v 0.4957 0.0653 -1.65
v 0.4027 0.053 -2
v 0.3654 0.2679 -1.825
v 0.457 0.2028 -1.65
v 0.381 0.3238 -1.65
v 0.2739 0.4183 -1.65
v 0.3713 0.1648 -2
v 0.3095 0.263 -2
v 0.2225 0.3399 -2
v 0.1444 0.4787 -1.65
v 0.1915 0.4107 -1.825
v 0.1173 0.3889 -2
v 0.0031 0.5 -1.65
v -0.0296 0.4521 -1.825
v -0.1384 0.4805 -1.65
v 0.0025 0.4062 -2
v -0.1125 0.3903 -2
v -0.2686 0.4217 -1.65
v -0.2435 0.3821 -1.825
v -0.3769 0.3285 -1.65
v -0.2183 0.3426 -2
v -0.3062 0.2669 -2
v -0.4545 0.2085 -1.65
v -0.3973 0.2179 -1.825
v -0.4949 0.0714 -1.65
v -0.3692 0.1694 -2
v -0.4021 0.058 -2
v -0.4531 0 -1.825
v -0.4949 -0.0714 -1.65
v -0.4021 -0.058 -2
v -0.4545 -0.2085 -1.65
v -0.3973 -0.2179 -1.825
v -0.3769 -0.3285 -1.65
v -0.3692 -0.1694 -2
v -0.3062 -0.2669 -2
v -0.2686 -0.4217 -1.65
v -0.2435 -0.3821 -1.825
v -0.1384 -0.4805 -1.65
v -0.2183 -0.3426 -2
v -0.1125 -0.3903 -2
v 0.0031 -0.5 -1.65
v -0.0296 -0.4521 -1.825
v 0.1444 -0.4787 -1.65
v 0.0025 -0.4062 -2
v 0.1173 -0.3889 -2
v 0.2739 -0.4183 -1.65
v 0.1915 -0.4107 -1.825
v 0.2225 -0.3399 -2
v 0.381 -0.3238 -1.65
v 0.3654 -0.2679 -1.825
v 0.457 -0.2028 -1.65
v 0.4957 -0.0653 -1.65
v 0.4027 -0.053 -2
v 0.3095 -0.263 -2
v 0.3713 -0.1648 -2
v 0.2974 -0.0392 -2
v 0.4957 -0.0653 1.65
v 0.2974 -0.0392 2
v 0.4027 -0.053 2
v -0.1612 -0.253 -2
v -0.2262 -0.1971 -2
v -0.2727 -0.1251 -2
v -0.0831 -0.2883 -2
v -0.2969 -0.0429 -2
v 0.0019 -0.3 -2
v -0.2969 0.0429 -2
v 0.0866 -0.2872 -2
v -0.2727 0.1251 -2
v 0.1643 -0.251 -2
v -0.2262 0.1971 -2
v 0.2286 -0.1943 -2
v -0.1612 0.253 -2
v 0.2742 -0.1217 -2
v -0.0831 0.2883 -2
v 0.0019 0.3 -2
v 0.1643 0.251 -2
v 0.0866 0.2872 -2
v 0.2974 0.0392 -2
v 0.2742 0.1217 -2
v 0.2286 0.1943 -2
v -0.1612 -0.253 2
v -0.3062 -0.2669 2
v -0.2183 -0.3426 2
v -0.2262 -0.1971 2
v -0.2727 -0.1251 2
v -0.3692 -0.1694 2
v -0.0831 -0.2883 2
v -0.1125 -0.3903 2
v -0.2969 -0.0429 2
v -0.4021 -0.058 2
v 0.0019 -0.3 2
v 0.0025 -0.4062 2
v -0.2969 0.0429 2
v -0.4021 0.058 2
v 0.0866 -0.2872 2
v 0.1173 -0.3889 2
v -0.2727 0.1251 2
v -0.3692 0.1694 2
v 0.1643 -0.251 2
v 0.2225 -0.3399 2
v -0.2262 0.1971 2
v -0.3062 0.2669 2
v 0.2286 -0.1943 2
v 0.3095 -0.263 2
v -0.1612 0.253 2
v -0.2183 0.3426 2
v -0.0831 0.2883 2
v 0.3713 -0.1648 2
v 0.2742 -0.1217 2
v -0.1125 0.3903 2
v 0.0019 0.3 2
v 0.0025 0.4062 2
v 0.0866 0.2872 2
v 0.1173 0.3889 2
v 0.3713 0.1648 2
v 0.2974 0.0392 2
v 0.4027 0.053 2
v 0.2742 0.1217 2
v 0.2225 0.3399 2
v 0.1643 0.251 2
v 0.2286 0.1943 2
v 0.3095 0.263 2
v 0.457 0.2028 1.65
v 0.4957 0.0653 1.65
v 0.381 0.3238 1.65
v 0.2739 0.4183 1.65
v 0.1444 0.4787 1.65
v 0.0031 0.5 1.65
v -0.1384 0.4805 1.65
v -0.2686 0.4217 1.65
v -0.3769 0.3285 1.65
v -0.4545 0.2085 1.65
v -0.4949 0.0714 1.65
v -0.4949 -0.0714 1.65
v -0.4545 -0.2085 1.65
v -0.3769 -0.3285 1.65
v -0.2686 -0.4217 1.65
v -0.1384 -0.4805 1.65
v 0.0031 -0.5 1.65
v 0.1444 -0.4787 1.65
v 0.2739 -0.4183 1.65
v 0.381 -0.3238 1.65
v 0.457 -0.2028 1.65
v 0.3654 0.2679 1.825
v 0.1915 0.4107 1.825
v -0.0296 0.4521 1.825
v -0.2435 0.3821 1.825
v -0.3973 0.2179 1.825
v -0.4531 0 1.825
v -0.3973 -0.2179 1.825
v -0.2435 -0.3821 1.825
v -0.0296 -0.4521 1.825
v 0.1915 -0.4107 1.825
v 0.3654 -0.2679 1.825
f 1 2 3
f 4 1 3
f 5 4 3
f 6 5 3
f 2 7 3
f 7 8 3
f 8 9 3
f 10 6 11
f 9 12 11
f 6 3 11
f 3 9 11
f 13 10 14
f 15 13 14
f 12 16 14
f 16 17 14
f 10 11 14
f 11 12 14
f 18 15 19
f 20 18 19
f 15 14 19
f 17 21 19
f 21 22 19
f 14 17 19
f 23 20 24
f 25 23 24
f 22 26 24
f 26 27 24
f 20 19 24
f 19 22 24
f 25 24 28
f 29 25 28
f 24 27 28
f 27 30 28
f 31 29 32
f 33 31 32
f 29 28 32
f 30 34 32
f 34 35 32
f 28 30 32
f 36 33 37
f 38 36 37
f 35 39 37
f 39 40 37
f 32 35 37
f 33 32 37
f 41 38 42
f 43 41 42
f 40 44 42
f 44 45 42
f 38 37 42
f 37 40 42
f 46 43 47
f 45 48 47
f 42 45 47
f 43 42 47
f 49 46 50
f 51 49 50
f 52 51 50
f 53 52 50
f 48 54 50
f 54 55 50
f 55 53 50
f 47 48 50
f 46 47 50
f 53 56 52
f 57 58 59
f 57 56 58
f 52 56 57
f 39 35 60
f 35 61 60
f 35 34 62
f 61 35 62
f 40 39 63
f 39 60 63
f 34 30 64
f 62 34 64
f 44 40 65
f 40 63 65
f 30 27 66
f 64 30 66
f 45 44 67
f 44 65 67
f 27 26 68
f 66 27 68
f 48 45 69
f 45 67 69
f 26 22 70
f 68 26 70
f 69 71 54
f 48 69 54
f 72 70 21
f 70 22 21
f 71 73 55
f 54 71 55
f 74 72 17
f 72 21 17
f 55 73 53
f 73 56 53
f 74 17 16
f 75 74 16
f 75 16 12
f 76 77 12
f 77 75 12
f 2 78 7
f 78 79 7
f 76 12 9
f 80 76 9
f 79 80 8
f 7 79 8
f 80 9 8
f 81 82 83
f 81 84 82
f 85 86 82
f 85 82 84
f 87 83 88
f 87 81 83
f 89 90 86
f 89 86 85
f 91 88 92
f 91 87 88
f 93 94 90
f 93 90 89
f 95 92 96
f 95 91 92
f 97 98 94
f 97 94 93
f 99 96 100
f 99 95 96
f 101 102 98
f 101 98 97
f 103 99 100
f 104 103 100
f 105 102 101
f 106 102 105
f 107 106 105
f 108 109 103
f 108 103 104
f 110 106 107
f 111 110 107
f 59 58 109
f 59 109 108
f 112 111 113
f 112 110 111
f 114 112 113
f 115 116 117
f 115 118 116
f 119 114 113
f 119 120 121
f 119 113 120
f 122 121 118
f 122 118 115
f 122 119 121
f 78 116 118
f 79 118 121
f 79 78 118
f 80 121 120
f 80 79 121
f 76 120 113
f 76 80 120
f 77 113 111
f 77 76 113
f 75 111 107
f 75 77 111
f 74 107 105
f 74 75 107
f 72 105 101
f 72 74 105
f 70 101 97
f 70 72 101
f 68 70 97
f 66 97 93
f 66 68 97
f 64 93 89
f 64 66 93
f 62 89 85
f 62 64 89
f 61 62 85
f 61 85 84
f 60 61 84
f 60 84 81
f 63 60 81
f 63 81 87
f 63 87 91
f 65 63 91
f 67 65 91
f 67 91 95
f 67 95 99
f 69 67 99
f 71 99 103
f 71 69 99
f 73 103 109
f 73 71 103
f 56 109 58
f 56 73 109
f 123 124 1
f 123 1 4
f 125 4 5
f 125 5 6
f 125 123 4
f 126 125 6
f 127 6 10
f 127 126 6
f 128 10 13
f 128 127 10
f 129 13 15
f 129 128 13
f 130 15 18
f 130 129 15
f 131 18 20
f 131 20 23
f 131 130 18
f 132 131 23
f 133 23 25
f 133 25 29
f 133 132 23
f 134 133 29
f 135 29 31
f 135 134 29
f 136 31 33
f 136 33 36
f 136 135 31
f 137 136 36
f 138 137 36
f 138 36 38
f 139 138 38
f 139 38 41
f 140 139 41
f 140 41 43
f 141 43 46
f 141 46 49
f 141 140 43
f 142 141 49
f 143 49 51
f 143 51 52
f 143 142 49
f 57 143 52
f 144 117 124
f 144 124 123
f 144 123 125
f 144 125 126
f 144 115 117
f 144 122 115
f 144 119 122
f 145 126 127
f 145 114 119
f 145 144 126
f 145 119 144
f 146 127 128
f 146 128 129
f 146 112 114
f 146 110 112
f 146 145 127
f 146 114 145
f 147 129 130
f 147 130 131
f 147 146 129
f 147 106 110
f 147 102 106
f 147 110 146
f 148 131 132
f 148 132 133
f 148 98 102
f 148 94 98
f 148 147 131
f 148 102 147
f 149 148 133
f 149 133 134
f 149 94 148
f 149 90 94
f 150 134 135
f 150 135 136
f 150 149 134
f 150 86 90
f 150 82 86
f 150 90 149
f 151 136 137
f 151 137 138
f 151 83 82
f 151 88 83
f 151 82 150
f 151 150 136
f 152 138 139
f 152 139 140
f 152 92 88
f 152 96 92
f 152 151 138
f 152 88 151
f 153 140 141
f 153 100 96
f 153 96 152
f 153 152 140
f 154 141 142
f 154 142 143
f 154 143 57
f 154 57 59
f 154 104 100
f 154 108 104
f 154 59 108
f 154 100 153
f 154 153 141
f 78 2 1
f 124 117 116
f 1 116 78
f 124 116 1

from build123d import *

# Parameters (mm, degrees)
SKICA1_R                 = 0.5
SKICA1_R_2               = 0.3
VYSUNOUT1_DEPTH          = 2
ZKOSIT1_SIZE             = 0.35
ZKOSIT1_SIZE2            = 0.093782217
ODEBRAT_VYSUNUT_M1_DEPTH = 5.062019202


with BuildPart() as part:
    # Skica1 → Vysunout1 (new, symmetric)
    with BuildSketch(Plane.XY):
        Circle(SKICA1_R)
        Circle(SKICA1_R_2, mode=Mode.SUBTRACT)
    extrude(amount=VYSUNOUT1_DEPTH, both=True)

    # Zkosit1
    zkosit1_edges = [part.edges().sort_by_distance(p)[0] for p in [
        (-0.5, 0, -2),
        (-0.5, 0, 2),
    ]]
    zkosit1_side = [part.faces().sort_by_distance(p)[0] for p in [
        (-0.5, 0, 0),
    ]]
    chamfer(zkosit1_edges, length=ZKOSIT1_SIZE, length2=ZKOSIT1_SIZE2, reference=zkosit1_side[0])

    # Skica2 → Odebrat vysunutím1 (cut, through all)
    with BuildSketch(Plane.XY.offset(2)):
        with BuildLine():
            Line((0.495722431, 0.065263096), (0, 0))
            Line((0, 0), (0.495722431, -0.065263096))
            ThreePointArc((0.495722431, -0.065263096), (0.5, 0), (0.495722431, 0.065263096))
        make_face()
    extrude(amount=-ODEBRAT_VYSUNUT_M1_DEPTH, mode=Mode.SUBTRACT)


solid = part.part
